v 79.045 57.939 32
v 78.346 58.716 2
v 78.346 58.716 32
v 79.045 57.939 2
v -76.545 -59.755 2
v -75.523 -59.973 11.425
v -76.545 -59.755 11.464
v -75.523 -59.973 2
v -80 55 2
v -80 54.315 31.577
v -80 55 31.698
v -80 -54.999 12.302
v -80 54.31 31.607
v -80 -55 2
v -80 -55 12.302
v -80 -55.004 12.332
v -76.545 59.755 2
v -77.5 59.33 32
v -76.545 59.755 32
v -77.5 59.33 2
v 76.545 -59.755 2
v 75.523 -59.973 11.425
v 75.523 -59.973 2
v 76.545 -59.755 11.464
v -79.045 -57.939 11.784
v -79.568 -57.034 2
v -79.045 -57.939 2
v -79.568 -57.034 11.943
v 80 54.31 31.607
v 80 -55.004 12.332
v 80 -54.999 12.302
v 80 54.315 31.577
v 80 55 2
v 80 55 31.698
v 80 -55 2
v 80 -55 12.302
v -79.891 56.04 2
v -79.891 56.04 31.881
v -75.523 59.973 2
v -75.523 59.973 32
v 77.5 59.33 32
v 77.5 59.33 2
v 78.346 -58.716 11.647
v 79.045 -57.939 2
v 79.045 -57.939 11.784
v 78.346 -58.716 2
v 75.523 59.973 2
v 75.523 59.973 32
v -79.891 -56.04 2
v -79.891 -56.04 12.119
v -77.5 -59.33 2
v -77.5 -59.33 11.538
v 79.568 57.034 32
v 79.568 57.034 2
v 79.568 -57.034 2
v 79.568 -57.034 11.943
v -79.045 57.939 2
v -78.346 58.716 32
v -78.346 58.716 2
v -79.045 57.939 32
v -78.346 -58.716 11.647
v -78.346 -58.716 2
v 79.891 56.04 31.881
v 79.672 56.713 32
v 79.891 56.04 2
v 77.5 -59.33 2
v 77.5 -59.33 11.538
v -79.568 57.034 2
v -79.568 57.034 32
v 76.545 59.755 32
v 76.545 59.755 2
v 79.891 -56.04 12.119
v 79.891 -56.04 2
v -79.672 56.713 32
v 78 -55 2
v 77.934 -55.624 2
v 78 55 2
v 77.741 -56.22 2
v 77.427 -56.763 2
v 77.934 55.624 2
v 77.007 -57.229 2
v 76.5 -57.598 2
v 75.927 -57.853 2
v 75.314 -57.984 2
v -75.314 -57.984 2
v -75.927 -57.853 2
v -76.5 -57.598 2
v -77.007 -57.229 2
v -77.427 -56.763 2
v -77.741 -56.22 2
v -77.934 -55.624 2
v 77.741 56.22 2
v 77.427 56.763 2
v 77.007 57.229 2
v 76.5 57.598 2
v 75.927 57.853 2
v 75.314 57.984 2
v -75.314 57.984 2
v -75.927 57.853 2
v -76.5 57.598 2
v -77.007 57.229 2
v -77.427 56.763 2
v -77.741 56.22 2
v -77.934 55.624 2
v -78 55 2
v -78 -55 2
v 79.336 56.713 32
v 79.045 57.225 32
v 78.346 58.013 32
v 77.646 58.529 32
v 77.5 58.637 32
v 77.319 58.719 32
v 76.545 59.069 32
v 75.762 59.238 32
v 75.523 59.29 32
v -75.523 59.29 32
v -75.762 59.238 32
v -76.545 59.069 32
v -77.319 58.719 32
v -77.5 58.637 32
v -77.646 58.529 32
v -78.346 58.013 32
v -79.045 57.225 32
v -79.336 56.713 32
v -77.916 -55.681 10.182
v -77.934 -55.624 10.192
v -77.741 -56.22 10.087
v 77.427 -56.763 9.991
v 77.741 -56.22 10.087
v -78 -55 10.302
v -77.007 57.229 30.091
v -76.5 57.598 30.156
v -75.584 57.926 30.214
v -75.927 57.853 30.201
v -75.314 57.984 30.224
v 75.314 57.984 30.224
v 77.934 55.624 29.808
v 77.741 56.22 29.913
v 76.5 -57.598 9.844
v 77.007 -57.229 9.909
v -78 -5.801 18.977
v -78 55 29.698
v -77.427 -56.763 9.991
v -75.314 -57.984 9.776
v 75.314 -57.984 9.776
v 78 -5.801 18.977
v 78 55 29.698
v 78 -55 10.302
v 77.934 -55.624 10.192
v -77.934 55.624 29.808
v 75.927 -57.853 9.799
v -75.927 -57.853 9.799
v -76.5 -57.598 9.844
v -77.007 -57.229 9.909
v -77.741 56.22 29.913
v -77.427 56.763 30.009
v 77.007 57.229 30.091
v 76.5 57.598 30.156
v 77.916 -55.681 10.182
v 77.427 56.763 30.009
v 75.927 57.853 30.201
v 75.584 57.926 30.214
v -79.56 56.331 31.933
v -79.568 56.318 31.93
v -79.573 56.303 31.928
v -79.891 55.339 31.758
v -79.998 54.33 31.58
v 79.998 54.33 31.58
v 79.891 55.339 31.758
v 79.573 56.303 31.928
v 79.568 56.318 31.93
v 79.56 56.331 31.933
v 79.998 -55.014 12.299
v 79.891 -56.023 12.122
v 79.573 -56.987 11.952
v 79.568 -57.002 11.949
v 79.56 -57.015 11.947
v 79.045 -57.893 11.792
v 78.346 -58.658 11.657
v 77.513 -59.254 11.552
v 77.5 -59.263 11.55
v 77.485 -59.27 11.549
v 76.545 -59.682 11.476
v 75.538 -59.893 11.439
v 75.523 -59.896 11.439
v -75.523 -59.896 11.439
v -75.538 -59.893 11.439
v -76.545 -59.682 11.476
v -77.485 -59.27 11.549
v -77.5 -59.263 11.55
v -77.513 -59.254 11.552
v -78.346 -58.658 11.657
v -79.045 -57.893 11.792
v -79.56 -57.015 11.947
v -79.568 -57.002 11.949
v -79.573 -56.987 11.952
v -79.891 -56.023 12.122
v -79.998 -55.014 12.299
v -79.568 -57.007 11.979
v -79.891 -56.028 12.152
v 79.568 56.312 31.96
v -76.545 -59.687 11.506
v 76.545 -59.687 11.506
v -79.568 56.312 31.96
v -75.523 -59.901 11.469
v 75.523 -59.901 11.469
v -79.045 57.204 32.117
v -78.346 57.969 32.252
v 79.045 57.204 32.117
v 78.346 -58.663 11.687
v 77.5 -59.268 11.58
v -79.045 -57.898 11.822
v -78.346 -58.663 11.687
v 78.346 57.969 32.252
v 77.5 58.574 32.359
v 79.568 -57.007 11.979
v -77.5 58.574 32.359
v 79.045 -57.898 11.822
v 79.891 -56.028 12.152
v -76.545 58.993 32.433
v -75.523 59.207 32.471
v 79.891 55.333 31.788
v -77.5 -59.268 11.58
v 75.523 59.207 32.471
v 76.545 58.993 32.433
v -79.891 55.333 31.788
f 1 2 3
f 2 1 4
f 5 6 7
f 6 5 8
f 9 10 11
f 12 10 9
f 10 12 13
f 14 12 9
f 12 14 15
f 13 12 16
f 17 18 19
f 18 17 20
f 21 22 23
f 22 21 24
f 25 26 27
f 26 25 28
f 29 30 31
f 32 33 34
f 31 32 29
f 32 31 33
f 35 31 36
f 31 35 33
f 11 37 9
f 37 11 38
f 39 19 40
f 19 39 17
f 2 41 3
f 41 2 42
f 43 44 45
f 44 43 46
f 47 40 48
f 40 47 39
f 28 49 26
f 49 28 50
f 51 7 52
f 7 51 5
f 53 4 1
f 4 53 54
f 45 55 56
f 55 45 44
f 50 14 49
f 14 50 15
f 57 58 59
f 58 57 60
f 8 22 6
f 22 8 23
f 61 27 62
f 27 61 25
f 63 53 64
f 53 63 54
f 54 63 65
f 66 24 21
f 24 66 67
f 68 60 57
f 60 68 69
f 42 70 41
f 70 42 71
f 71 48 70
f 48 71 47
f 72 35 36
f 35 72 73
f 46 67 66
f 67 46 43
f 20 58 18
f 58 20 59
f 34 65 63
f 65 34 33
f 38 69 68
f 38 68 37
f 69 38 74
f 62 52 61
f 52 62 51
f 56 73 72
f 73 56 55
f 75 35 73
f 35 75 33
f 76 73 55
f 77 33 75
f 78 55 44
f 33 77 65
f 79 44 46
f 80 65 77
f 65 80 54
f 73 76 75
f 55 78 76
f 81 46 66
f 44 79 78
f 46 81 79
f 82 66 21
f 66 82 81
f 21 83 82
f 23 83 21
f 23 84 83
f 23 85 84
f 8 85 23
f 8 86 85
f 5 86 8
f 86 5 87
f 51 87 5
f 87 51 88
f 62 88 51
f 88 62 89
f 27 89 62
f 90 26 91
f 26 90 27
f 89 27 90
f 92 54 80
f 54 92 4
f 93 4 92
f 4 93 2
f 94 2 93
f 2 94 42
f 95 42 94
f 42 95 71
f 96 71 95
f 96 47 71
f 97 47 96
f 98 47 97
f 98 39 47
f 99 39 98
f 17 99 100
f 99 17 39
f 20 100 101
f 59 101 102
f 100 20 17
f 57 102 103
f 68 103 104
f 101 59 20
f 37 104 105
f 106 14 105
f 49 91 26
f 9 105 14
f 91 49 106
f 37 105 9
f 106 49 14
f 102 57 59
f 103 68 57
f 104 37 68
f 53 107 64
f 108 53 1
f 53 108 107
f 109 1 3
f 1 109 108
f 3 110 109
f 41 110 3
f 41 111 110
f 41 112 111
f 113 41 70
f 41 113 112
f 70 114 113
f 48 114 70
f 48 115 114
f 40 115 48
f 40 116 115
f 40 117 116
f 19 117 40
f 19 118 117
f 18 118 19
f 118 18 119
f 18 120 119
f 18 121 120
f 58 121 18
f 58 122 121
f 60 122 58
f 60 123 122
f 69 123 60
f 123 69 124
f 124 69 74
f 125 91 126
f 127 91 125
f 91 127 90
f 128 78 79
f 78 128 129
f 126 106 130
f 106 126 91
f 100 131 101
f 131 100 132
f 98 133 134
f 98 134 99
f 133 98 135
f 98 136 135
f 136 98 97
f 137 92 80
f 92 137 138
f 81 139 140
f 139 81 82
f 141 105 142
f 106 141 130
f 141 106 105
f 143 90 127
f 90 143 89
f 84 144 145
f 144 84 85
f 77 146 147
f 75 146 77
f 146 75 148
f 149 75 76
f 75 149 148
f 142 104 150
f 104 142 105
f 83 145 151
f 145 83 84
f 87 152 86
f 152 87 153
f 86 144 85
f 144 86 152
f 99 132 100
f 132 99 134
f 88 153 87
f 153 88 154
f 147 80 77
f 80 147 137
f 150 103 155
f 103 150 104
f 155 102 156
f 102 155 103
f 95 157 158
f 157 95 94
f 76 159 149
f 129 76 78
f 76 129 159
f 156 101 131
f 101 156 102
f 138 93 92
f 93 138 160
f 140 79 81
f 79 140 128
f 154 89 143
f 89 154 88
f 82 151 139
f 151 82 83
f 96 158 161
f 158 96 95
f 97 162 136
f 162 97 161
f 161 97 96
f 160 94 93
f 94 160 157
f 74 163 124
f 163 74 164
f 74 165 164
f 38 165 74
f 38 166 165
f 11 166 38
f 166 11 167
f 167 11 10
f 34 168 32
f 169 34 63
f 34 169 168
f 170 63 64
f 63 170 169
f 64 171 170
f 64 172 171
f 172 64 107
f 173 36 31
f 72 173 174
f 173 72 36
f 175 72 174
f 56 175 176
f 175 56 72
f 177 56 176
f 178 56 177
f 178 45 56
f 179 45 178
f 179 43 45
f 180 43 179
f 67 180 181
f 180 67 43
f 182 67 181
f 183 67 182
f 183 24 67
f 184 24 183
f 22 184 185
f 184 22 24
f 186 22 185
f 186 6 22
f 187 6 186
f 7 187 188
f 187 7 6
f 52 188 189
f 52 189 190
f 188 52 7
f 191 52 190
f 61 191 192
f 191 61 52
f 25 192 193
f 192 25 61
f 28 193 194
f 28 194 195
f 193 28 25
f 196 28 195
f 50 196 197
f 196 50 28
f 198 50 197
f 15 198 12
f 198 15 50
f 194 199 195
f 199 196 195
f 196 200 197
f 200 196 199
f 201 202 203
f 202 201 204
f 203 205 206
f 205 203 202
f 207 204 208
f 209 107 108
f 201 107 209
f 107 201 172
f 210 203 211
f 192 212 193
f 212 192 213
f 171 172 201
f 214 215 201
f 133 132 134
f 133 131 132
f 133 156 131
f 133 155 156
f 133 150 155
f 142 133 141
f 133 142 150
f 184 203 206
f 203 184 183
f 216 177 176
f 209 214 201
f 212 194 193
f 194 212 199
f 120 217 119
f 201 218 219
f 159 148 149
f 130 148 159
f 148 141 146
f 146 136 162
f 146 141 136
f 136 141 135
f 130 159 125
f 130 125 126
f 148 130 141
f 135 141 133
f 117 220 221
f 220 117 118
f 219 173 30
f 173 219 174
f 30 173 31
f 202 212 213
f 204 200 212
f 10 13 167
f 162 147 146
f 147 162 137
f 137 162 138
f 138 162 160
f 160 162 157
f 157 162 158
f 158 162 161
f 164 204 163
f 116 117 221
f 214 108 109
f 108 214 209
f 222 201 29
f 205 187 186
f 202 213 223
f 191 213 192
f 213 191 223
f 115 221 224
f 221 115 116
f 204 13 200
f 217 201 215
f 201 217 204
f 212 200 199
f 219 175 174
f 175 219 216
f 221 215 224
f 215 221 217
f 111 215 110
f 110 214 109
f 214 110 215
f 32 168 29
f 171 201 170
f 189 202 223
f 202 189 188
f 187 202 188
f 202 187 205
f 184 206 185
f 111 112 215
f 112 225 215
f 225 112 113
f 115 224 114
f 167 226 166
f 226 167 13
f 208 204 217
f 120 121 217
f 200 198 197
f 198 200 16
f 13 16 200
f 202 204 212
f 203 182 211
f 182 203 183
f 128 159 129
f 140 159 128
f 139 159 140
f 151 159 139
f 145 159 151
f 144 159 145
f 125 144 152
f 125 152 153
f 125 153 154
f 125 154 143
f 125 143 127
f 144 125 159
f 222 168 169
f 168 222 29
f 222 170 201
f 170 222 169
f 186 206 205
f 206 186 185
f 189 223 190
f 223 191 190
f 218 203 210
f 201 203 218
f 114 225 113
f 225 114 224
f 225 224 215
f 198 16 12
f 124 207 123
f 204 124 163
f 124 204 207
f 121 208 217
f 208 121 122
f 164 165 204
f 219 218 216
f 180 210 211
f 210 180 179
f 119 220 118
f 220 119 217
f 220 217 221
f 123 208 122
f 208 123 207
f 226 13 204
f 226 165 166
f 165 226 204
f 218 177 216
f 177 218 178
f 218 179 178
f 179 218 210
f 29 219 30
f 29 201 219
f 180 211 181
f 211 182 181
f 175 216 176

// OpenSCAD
module roundedRect(size, radius, fn = 30)
{
    x = size[0] / 2;
    y = size[1] / 2;
    z = size[2];

    linear_extrude(height=z)
    hull()
    {
        translate([-x+radius, -y+radius, 0])
        circle(r=radius, $fn = fn);

        translate([x-radius, -y+radius, 0])
        circle(r=radius, $fn = fn);

        translate([-x+radius, y-radius, 0])
        circle(r=radius, $fn = fn);

        translate([x-radius, y-radius, 0])
        circle(r=radius, $fn = fn);
    }
}

$bottomThickness = 2;
$outerWidth = 160;
$outerHeight = 120;
$rimHeight = 30;

union(){
    translate([0,0,20]){
        rotate([10,0,0]){
            roundedRect([$outerWidth,$outerHeight+1,$bottomThickness],5);
        }
    }
    
    difference(){
        translate([0,0,$bottomThickness]){
            difference(){
                roundedRect([$outerWidth,$outerHeight,$rimHeight],5);
                translate([0,0,-2]){
                    roundedRect([$outerWidth - $bottomThickness * 2,$outerHeight - $bottomThickness * 2,$rimHeight*2],3);
                }
            }
        }
        
        translate([0,0,22]){
            rotate([10,0,0]){
                roundedRect([$outerWidth + 10,$outerHeight + 10,30],5);
            }
        }
    }
}
